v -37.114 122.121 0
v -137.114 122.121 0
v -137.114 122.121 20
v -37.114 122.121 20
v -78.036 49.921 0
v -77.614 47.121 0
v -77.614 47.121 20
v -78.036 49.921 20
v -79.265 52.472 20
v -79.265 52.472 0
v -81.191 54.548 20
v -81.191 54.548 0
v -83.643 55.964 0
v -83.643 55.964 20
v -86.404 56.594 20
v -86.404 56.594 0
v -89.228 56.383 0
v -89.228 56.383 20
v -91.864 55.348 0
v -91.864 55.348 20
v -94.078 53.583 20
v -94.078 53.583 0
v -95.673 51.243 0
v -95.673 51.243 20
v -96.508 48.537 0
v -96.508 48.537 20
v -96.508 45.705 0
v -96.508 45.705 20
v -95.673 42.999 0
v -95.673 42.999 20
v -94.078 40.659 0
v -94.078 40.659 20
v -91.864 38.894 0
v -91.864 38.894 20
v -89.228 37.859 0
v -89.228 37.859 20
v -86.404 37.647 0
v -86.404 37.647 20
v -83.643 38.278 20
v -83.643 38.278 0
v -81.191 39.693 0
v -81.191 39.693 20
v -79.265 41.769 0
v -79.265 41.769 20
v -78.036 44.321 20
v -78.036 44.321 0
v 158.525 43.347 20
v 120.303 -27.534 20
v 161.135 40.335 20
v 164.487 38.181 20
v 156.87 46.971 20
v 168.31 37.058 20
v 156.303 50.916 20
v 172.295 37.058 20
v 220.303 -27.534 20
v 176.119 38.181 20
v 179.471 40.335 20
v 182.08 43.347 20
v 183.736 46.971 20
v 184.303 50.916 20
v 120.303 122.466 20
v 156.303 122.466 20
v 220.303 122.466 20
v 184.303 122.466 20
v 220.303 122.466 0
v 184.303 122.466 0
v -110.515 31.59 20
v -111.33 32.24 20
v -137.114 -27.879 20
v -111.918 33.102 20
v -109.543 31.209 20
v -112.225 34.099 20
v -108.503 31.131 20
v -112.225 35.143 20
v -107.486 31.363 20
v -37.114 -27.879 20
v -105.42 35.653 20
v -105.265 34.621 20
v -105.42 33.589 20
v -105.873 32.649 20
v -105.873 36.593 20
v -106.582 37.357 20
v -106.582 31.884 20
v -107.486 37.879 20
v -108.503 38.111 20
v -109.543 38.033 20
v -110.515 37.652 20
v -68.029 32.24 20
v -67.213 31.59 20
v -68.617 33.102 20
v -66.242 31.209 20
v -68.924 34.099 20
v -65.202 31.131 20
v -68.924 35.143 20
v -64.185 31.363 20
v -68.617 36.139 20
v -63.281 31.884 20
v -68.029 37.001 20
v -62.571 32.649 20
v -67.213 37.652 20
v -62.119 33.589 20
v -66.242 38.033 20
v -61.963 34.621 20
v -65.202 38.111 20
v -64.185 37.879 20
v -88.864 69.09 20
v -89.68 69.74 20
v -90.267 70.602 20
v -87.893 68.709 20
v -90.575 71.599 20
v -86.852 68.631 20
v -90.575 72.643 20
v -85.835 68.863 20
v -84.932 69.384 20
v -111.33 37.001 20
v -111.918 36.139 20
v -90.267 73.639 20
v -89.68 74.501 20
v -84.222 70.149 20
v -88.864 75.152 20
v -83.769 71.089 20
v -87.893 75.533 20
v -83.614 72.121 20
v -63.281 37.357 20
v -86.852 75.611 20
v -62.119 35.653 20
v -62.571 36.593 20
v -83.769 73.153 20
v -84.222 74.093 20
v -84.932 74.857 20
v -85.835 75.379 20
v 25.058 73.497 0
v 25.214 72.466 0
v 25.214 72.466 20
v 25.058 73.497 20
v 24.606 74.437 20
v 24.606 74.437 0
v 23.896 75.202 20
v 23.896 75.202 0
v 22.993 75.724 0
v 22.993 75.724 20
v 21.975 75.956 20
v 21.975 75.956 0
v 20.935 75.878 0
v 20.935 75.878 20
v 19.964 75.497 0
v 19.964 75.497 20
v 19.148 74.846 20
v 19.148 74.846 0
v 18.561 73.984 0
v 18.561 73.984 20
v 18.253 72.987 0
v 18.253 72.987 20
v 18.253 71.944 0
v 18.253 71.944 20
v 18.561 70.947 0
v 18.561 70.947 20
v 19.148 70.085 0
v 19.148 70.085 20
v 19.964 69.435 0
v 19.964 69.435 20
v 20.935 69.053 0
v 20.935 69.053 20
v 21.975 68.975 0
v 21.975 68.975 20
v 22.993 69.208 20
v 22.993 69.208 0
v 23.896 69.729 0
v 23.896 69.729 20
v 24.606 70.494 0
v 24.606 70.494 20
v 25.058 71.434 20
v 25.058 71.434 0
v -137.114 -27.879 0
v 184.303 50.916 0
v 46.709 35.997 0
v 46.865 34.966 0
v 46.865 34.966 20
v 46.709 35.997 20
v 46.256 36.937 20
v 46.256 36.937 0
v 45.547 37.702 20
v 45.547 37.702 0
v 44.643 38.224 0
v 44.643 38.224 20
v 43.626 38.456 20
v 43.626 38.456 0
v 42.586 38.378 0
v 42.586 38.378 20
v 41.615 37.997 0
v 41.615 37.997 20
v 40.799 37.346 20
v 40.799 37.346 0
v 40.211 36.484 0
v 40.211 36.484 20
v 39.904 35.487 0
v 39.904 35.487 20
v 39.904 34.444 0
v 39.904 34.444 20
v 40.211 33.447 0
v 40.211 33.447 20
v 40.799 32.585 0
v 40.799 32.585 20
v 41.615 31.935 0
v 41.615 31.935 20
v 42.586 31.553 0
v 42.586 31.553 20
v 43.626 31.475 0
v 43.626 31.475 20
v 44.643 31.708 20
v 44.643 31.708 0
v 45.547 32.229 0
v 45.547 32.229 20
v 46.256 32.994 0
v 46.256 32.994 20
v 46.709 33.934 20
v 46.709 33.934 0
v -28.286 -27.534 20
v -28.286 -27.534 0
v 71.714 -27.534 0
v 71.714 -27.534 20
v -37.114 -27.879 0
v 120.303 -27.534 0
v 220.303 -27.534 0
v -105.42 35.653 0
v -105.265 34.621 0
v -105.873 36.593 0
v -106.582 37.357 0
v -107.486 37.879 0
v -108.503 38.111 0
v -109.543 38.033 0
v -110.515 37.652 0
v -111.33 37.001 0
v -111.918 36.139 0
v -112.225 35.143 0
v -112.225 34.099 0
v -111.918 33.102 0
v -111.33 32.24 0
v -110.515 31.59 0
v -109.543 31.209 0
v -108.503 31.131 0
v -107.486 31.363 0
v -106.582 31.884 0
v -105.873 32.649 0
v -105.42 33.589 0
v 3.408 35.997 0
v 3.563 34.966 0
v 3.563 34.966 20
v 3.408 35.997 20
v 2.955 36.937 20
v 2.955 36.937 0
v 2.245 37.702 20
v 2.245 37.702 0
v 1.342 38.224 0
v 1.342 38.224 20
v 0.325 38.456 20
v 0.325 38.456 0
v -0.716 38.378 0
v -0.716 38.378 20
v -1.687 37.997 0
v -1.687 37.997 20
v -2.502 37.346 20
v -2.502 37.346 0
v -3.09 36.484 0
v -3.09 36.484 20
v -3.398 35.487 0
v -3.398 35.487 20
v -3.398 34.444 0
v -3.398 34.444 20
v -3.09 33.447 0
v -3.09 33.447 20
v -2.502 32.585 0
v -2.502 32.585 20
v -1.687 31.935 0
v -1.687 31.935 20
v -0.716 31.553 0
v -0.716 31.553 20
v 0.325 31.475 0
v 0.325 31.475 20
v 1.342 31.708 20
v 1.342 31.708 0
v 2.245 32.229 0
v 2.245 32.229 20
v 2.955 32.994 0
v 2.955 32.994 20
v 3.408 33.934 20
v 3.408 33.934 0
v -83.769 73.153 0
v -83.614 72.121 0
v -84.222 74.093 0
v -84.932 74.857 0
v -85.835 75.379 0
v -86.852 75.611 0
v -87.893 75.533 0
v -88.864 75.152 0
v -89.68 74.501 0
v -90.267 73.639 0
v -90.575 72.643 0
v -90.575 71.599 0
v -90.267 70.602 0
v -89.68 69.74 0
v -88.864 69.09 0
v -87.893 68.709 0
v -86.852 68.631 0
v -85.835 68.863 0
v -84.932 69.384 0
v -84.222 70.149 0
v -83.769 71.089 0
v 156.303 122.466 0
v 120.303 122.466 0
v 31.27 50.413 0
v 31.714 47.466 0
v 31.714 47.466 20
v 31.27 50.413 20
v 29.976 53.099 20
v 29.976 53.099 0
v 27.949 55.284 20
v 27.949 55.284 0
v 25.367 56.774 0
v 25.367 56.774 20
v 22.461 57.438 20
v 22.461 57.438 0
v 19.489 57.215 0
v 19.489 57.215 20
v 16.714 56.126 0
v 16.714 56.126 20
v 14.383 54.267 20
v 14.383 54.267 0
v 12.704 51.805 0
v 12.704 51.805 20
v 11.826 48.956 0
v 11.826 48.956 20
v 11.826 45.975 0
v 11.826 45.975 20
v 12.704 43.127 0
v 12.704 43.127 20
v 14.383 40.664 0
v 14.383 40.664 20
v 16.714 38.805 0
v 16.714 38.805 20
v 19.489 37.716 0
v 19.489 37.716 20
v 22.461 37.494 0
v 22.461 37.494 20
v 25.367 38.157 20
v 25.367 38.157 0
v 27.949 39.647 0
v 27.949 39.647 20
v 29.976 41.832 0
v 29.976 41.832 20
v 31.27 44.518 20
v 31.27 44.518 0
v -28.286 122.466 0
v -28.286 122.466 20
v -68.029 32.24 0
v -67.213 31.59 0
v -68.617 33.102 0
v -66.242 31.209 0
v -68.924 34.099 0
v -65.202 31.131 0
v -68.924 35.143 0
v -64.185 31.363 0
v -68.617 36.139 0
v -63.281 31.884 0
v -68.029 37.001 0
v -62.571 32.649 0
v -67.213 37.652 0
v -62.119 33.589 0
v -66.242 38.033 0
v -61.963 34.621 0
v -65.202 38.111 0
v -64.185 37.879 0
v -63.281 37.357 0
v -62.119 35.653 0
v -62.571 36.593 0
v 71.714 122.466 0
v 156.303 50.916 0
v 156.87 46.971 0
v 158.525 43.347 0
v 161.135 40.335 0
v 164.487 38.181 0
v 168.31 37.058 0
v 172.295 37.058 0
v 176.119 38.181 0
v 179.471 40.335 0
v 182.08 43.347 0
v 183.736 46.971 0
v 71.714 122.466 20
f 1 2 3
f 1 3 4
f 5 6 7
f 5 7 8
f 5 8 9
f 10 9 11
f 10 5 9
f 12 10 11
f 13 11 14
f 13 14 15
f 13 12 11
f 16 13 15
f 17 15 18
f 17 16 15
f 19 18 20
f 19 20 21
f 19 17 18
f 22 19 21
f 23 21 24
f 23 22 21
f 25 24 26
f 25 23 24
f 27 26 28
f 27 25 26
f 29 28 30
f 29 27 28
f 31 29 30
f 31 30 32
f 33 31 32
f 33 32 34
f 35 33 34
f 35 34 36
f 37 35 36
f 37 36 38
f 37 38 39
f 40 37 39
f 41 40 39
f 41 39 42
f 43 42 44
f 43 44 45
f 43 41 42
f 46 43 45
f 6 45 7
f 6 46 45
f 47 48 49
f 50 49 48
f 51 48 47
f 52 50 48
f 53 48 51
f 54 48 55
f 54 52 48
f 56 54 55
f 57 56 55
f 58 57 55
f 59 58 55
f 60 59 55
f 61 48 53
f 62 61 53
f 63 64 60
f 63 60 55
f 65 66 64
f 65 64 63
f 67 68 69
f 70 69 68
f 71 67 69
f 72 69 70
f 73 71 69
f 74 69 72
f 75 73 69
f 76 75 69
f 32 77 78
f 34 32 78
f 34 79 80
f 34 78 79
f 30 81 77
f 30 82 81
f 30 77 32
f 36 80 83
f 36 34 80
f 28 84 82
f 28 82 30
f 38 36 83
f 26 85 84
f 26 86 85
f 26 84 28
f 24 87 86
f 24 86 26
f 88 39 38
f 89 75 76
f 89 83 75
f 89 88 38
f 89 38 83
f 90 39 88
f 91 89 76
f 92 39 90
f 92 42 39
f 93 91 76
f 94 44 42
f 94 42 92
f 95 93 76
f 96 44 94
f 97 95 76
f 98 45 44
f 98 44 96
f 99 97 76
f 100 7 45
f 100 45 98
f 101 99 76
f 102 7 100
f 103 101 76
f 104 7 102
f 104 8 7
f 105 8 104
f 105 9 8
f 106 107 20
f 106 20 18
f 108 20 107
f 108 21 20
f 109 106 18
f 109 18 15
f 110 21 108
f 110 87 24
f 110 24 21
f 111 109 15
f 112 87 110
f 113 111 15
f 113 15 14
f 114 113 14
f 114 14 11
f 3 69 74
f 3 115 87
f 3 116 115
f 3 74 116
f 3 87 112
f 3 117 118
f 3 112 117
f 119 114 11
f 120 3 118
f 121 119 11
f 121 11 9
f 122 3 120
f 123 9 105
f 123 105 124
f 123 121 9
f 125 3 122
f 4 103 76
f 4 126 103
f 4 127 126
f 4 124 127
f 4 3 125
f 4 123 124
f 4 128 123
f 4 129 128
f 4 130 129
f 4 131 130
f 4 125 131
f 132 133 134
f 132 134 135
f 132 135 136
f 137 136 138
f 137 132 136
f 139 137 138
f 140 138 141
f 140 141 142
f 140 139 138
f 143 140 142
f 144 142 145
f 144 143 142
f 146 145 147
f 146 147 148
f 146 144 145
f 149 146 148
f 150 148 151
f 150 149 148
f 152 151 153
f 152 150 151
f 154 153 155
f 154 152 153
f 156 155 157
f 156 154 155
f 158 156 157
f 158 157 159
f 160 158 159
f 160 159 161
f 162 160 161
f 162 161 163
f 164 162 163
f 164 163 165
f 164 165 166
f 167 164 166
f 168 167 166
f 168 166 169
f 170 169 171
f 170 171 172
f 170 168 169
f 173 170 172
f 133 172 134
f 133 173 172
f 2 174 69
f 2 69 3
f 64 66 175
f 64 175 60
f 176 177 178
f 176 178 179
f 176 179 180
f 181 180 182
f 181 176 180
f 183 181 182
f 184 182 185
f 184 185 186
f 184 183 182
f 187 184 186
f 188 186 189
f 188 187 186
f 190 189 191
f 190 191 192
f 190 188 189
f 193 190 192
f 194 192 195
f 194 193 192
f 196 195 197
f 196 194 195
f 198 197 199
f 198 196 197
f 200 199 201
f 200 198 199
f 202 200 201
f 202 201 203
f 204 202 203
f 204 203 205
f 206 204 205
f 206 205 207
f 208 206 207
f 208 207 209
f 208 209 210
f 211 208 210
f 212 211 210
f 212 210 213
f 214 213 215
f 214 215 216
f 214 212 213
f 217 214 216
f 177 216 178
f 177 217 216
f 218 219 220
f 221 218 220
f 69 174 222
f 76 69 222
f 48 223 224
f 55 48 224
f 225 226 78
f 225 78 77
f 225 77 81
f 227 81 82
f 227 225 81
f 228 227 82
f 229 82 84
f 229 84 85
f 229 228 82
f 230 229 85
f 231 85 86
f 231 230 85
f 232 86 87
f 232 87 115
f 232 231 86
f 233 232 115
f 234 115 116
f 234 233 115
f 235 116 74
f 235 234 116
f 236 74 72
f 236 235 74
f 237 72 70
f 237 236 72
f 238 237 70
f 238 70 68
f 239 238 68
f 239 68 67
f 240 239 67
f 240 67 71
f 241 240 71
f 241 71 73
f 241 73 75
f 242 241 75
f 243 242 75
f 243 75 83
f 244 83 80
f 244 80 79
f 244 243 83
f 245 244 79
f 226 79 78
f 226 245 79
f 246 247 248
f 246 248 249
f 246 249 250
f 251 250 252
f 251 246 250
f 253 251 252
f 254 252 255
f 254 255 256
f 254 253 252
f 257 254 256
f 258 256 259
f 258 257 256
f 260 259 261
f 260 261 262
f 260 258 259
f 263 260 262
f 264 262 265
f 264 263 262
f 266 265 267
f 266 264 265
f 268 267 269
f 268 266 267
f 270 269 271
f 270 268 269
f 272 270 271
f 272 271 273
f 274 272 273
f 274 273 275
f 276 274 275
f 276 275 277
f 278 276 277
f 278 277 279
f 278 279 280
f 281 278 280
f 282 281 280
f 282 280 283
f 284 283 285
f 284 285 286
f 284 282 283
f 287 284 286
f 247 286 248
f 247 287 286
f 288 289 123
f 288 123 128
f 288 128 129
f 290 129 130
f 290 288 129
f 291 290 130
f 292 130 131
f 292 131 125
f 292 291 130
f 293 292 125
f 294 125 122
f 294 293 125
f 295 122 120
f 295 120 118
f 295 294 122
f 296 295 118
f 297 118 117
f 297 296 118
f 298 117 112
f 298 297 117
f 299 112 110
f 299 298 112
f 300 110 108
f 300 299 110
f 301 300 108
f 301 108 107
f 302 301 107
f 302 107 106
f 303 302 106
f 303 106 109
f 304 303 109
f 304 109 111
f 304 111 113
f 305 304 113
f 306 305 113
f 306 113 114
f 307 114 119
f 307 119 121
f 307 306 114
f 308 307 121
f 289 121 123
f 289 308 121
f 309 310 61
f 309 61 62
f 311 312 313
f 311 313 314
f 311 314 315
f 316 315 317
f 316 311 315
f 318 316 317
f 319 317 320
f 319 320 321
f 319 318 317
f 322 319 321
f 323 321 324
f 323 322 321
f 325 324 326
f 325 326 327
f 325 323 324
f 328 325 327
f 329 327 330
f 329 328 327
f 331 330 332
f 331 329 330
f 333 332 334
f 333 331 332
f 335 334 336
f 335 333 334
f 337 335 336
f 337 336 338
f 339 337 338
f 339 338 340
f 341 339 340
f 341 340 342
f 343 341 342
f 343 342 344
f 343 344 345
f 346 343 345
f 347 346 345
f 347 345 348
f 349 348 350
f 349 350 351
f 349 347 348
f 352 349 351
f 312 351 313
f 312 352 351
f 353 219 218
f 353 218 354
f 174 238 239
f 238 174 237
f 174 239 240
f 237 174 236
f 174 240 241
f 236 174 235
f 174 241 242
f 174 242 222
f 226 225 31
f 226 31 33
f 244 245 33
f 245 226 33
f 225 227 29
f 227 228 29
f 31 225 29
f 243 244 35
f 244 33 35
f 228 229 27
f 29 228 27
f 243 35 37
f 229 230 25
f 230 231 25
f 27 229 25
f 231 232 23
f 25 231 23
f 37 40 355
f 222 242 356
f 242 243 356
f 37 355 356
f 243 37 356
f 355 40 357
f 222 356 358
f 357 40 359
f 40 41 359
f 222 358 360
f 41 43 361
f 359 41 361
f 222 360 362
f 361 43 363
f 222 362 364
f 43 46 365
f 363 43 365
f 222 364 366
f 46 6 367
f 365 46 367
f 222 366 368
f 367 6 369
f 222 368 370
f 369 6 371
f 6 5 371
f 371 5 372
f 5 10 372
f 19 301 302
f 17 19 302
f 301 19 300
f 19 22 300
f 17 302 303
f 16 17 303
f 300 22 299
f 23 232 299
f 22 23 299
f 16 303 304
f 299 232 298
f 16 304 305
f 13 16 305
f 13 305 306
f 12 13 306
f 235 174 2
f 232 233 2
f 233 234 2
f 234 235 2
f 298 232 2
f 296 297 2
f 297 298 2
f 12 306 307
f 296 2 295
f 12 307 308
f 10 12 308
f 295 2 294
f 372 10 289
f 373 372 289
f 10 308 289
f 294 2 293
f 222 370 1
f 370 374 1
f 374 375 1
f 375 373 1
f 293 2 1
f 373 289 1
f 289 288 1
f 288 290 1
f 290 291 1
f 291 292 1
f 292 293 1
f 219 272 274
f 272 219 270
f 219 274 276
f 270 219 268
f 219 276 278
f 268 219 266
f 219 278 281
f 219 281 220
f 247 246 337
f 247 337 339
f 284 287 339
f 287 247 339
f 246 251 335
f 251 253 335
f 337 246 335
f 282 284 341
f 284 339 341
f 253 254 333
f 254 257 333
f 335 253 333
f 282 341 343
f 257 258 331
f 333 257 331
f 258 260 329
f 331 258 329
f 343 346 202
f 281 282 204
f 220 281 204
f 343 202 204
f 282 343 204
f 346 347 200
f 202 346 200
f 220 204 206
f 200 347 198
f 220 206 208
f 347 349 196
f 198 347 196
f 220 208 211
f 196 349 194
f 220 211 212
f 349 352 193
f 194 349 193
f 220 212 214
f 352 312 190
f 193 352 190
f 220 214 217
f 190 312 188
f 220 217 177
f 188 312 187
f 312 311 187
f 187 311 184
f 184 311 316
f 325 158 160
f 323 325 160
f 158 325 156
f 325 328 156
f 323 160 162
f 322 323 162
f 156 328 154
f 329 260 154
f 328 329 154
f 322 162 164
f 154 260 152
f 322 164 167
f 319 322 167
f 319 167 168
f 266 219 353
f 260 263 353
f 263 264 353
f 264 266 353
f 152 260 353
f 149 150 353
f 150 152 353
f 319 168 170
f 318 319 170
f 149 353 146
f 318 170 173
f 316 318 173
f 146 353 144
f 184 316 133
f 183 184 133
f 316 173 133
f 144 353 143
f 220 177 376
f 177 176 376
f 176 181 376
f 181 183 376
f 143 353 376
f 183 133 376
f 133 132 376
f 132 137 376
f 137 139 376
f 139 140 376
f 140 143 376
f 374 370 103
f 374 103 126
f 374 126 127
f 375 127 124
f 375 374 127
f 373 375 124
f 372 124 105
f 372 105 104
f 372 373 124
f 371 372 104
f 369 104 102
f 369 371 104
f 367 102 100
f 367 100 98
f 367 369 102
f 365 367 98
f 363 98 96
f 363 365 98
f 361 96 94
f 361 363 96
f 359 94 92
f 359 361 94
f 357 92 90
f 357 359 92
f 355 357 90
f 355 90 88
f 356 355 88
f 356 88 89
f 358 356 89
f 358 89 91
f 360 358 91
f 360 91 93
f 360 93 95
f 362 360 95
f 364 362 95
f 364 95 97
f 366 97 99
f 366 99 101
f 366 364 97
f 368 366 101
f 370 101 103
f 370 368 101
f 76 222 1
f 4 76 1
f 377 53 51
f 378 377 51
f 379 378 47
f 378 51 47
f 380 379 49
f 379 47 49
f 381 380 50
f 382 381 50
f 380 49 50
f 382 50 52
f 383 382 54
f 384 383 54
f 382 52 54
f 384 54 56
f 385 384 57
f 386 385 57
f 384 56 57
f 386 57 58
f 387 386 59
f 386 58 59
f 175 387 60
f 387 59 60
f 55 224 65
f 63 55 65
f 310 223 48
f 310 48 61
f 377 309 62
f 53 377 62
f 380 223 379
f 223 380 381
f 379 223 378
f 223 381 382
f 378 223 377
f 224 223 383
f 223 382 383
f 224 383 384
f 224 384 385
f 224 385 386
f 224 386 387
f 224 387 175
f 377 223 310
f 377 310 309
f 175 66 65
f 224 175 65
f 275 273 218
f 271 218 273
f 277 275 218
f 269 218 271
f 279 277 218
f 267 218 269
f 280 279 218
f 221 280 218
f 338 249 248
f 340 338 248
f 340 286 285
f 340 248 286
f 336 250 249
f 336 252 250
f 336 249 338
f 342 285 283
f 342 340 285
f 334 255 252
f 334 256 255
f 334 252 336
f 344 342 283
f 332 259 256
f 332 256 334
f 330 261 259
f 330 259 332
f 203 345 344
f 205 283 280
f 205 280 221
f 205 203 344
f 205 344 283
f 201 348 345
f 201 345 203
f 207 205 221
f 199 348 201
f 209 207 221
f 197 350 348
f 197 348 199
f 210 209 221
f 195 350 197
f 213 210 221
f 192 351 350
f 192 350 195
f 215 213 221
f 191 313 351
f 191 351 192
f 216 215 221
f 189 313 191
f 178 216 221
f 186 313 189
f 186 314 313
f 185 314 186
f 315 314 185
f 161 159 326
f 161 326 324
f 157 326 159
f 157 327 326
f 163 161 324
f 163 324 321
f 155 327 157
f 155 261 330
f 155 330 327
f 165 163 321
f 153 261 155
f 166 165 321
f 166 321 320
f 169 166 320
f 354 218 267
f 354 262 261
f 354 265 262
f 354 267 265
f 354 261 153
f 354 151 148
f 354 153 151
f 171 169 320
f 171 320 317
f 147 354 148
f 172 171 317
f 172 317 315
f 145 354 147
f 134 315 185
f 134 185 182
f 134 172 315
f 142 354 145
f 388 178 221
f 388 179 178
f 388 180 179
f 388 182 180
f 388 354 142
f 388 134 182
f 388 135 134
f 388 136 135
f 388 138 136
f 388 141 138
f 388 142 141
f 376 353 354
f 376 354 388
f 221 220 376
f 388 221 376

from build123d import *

# Parameters (mm, degrees)
F0_W     = 100
F0_H     = 150
F0_R     = 3.5
F0_R_2   = 10
F0_R_3   = 9.5
F1_DEPTH = 20
F2_W     = 14
F2_H     = 20
F3_DEPTH = 71.55
F5_DEPTH = 25


with BuildPart() as f1:
    # F0 (on Top) → F1 (new body)
    with BuildSketch(Plane.XY):
        with Locations((21.713901, 47.46569)):
            Rectangle(F0_W, F0_H)
        with Locations((0.063265, 34.96569)):
            Circle(F0_R, mode=Mode.SUBTRACT)
        with Locations((43.364536, 34.96569)):
            Circle(F0_R, mode=Mode.SUBTRACT)
        with Locations((21.713901, 47.46569)):
            Circle(F0_R_2, mode=Mode.SUBTRACT)
        with Locations((21.713901, 72.46569)):
            Circle(F0_R, mode=Mode.SUBTRACT)
        with Locations((-87.113902, 47.120893)):
            Rectangle(F0_W, F0_H)
        with Locations((-108.764537, 34.620893)):
            Circle(F0_R, mode=Mode.SUBTRACT)
        with Locations((-65.463267, 34.620893)):
            Circle(F0_R, mode=Mode.SUBTRACT)
        with Locations((-87.113902, 47.120893)):
            Circle(F0_R_3, mode=Mode.SUBTRACT)
        with Locations((-87.113902, 72.120893)):
            Circle(F0_R, mode=Mode.SUBTRACT)
        with Locations((170.302761, 47.46569)):
            Rectangle(F0_W, F0_H)
    extrude(amount=F1_DEPTH)

    # F2 (on face) → F3 (cut)
    with BuildSketch(Plane(origin=(0, 122.46569, 0), x_dir=(-1, 0, 0), z_dir=(0, 1, 0))):
        with Locations((-177.302761, 10)):
            Rectangle(F2_W, F2_H)
        with Locations((-163.302761, 10)):
            Rectangle(F2_W, F2_H)
    extrude(amount=-F3_DEPTH, mode=Mode.SUBTRACT)

    # F4 (on face) → F5 (cut)
    with BuildSketch(Plane.XY.offset(20)):
        with BuildLine():
            Line((184.302761, 50.91569), (156.302761, 50.91569))
            ThreePointArc((156.302761, 50.91569), (170.302761, 36.91569), (184.302761, 50.91569))
        make_face()
    extrude(amount=-F5_DEPTH, mode=Mode.SUBTRACT)


solid = f1.part
